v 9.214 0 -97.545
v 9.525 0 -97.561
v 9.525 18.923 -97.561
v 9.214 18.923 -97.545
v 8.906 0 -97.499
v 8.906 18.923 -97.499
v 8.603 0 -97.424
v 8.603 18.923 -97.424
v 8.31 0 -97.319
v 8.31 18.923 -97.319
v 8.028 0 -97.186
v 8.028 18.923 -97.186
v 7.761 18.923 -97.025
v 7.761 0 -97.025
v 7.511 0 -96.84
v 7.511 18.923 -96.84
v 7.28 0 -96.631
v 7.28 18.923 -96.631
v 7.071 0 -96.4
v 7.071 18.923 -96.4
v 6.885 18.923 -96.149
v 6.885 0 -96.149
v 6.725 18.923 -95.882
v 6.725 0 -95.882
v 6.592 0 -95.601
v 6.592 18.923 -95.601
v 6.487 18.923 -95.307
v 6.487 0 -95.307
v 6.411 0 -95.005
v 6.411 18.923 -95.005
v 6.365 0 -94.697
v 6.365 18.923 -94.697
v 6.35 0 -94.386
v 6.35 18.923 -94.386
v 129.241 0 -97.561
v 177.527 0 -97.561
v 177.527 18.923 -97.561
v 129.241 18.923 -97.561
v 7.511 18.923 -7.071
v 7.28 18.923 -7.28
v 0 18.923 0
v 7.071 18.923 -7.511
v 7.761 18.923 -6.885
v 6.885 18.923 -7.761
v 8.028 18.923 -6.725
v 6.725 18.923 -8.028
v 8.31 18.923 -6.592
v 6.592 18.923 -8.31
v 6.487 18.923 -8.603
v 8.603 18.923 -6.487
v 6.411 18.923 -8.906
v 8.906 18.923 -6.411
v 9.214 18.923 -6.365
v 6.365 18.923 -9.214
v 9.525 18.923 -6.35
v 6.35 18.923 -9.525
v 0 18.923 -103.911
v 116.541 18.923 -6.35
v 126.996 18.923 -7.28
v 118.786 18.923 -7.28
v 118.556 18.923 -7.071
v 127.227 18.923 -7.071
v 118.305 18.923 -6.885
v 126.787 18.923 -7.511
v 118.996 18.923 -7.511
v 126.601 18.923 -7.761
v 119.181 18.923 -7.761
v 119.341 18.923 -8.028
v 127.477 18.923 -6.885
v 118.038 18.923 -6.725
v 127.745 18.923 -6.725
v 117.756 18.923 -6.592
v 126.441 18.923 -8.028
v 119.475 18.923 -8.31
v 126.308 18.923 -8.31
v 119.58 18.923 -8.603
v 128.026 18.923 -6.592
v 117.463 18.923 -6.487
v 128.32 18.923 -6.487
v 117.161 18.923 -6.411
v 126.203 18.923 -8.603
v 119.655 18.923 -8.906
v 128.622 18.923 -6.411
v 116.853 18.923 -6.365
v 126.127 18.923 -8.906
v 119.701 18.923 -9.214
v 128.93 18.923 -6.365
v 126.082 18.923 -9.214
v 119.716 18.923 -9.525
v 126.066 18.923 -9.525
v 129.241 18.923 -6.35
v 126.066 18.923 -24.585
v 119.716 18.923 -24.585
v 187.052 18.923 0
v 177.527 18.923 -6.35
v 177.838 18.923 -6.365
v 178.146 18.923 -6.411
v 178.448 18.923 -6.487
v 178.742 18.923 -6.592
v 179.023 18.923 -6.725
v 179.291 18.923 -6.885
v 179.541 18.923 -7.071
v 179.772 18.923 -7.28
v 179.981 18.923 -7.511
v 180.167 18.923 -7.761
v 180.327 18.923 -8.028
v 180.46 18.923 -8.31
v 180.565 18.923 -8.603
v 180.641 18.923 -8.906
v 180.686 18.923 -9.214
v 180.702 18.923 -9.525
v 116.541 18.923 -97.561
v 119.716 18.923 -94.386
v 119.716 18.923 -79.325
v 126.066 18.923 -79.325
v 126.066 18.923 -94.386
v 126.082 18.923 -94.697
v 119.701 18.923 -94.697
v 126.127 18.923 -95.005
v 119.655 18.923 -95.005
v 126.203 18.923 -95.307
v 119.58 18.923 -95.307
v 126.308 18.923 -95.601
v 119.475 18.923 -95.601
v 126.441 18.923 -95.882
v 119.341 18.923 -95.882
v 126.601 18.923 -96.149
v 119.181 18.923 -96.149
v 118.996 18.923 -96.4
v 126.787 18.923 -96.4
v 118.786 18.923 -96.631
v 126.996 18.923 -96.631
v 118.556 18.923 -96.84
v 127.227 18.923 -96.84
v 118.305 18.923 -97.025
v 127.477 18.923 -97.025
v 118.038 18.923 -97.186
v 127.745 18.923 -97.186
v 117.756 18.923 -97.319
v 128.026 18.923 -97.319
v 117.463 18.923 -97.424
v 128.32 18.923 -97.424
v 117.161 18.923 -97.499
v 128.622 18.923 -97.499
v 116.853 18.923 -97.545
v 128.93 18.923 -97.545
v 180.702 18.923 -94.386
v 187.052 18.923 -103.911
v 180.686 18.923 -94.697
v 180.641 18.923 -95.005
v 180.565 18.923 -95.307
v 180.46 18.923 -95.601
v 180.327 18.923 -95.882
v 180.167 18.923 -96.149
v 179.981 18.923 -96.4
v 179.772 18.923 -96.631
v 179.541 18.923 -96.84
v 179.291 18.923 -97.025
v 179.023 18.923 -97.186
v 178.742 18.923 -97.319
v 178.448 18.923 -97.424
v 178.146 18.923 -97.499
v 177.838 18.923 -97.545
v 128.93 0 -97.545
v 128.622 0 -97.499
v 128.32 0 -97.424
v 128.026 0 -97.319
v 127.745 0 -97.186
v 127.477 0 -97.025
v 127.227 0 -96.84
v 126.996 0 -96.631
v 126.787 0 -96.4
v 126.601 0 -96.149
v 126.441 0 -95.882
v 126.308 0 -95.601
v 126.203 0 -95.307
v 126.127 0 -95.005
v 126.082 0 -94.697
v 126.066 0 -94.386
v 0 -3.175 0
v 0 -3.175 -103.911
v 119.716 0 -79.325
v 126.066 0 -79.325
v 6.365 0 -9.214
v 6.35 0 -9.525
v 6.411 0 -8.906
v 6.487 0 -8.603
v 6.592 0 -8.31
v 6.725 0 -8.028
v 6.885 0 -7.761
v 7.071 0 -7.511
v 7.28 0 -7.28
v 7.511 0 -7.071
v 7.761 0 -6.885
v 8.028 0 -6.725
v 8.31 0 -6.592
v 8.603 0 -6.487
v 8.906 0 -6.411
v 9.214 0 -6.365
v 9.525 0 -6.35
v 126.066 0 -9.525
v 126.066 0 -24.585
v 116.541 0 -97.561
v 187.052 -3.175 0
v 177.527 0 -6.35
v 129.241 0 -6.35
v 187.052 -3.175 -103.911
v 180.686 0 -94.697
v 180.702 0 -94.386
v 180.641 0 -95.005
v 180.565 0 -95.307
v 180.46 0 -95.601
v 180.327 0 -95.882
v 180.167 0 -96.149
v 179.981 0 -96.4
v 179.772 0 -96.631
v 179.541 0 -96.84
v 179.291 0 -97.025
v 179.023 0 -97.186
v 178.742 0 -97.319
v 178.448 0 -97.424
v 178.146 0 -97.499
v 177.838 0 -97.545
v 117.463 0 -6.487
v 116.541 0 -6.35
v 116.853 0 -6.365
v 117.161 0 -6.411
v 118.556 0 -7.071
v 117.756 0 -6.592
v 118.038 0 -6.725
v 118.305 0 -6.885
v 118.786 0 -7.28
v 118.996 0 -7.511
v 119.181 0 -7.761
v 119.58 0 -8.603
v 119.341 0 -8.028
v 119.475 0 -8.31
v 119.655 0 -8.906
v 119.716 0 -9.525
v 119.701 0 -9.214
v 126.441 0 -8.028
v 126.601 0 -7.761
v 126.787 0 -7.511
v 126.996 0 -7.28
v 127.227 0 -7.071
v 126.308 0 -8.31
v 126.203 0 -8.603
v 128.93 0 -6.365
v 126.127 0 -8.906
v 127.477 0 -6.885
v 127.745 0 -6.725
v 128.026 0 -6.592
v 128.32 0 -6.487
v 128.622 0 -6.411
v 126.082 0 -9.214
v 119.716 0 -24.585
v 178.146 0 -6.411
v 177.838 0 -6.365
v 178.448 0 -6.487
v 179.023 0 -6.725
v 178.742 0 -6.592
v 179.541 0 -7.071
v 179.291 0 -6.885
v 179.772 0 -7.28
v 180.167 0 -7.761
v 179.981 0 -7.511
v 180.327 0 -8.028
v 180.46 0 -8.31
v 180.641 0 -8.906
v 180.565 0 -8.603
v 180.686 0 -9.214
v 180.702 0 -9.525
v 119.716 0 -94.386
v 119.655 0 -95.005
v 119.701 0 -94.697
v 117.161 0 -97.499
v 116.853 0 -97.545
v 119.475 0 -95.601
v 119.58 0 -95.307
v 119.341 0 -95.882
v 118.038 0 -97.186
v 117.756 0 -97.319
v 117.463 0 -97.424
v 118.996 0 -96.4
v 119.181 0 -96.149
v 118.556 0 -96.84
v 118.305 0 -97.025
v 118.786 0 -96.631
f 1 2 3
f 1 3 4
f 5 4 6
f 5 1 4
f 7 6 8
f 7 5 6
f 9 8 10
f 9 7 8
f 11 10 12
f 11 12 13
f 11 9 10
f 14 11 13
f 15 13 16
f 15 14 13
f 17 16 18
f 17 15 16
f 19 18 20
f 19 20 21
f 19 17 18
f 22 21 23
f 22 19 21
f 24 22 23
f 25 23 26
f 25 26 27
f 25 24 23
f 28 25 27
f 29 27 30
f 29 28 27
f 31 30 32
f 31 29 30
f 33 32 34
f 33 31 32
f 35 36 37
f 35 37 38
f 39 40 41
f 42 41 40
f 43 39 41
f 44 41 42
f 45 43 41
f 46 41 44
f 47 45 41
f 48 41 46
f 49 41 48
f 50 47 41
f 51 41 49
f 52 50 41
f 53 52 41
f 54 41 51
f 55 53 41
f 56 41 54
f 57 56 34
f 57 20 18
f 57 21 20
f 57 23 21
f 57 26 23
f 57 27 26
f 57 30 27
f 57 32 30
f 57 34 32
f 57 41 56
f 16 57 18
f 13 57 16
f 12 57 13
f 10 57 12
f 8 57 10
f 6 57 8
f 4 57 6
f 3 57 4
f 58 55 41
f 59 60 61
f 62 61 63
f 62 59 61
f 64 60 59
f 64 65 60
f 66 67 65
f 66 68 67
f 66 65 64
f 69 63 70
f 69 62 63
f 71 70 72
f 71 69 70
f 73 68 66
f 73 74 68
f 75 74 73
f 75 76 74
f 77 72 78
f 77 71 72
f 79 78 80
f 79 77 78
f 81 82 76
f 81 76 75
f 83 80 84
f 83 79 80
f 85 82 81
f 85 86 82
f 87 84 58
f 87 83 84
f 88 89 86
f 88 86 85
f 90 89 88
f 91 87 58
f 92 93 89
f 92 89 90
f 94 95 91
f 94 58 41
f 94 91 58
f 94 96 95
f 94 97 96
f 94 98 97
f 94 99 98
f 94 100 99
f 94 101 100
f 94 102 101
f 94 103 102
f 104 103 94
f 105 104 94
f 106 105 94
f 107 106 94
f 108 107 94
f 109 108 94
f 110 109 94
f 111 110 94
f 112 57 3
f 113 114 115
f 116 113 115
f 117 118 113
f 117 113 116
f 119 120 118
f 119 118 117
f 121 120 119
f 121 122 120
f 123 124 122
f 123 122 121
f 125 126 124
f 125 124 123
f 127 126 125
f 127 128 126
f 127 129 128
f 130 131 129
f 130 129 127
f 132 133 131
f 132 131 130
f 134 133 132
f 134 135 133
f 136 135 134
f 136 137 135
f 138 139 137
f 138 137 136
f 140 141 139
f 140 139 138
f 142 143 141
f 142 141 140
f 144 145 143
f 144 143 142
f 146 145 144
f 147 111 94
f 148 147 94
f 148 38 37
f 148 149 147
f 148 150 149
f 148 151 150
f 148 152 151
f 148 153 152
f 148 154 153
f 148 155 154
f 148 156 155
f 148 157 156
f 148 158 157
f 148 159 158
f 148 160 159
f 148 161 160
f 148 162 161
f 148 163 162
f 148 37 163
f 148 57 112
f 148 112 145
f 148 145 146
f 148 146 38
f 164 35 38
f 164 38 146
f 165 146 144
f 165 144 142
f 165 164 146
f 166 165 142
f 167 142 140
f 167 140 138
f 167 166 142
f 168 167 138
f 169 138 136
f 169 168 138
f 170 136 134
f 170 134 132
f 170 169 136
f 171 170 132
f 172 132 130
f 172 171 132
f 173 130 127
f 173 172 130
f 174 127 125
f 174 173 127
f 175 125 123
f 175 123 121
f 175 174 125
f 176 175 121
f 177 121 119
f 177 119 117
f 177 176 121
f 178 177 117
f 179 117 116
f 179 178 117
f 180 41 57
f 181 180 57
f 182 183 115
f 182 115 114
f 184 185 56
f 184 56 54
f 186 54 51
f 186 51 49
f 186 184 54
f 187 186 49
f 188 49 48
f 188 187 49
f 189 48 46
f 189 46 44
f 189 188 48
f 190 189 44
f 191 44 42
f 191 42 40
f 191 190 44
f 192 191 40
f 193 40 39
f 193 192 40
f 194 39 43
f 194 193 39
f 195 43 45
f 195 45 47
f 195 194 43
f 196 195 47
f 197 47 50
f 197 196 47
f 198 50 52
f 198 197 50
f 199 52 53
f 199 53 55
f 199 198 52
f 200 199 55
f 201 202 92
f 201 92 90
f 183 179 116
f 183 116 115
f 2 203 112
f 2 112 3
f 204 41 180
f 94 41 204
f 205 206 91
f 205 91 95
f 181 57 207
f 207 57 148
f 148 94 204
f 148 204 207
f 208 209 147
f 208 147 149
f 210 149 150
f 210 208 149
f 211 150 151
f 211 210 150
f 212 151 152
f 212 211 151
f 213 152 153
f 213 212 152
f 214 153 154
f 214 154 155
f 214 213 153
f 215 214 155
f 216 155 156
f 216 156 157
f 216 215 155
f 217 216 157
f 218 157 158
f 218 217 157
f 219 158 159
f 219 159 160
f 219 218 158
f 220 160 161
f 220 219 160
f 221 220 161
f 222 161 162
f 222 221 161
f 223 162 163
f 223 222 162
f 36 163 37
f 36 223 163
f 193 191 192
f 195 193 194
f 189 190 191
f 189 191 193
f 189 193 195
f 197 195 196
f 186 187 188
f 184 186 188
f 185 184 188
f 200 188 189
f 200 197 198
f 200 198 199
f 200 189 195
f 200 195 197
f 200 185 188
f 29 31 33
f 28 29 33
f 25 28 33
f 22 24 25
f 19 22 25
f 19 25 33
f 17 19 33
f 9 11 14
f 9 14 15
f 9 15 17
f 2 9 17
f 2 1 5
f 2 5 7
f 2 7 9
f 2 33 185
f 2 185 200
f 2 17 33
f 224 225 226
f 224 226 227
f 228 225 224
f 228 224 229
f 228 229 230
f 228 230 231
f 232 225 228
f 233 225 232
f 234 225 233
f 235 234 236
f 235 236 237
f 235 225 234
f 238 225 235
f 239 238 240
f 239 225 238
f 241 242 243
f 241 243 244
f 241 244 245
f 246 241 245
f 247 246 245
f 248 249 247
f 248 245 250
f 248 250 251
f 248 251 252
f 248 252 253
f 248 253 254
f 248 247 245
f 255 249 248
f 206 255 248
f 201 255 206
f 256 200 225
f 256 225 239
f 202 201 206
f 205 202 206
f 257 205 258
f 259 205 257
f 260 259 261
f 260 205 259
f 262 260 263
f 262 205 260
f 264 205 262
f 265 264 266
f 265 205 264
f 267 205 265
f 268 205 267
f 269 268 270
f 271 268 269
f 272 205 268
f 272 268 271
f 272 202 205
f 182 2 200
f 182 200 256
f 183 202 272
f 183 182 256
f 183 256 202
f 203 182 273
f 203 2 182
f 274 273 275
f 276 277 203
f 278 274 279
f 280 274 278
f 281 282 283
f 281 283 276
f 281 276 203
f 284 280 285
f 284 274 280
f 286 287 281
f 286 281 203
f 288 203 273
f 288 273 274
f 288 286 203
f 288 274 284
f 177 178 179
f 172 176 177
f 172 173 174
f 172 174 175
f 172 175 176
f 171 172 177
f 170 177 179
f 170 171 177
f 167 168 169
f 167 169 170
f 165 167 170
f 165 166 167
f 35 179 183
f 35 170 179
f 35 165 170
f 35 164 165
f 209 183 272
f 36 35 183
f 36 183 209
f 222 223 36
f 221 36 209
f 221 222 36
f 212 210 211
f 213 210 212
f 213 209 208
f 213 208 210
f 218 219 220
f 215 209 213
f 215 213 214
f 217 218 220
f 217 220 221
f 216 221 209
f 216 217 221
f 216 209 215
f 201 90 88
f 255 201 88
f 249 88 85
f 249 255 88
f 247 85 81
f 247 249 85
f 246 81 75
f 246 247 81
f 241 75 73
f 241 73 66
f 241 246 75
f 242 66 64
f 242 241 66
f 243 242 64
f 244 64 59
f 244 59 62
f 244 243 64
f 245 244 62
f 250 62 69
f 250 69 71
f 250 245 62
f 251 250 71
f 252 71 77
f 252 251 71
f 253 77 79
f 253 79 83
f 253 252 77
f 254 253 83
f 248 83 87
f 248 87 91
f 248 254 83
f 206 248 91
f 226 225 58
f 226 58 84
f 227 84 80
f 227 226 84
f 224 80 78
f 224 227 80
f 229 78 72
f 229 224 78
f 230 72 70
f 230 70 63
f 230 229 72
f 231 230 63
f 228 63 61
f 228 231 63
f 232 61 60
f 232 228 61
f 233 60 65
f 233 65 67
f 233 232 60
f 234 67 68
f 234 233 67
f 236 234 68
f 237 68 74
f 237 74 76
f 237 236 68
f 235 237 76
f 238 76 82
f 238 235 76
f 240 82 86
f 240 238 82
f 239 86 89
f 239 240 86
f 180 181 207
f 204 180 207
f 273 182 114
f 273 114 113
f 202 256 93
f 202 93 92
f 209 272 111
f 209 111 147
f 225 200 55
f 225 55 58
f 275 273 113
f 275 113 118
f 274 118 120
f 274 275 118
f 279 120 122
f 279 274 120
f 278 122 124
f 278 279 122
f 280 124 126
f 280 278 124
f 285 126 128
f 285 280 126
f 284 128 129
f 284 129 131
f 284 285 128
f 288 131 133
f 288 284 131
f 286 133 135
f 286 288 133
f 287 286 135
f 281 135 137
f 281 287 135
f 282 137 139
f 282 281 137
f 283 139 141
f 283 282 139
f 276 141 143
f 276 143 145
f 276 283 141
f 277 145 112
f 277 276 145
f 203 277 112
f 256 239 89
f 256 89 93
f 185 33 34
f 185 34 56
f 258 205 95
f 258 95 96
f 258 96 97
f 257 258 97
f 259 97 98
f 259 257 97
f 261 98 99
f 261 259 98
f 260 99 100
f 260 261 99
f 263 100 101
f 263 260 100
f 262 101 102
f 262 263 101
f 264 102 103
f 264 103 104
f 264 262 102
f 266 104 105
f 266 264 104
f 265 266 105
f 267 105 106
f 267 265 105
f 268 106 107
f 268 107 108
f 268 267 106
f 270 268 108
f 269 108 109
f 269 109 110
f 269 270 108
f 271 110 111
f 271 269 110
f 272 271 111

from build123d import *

# Parameters (mm, degrees)
SKETCH11_W     = 187.05178758
SKETCH11_H     = 103.91050065
EXTRUDE5_DEPTH = 18.923
SKETCH14_W     = 187.05178758
SKETCH14_H     = 103.91050065
EXTRUDE6_DEPTH = 3.175


with BuildPart() as part:
    # Sketch11 → Extrude5 (new body)
    with BuildSketch(Plane(origin=(0, 0, 0), x_dir=(1, 0, 0), z_dir=(0, 1, 0))):
        with Locations((93.52589379, 51.955250325)):
            Rectangle(SKETCH11_W, SKETCH11_H)
        with BuildLine():
            Line((9.525, 6.35), (116.541319734, 6.35))
            ThreePointArc((116.541319734, 6.35), (118.786383764, 7.27993597), (119.716319734, 9.525))
            Line((119.716319734, 9.525), (119.716319734, 24.585352544))
            Line((119.716319734, 24.585352544), (126.066319734, 24.585352544))
            Line((126.066319734, 24.585352544), (126.066319734, 9.525))
            ThreePointArc((126.066319734, 9.525), (126.996255703, 7.27993597), (129.241319734, 6.35))
            Line((129.241319734, 6.35), (177.52678758, 6.35))
            ThreePointArc((177.52678758, 6.35), (179.77185161, 7.27993597), (180.70178758, 9.525))
            Line((180.70178758, 9.525), (180.70178758, 94.38550065))
            ThreePointArc((180.70178758, 94.38550065), (179.77185161, 96.63056468), (177.52678758, 97.56050065))
            Line((177.52678758, 97.56050065), (129.241319734, 97.56050065))
            ThreePointArc((129.241319734, 97.56050065), (126.996255703, 96.63056468), (126.066319734, 94.38550065))
            Line((126.066319734, 94.38550065), (126.066319734, 79.325148105))
            Line((126.066319734, 79.325148105), (119.716319734, 79.325148105))
            Line((119.716319734, 79.325148105), (119.716319734, 94.38550065))
            ThreePointArc((119.716319734, 94.38550065), (118.786383764, 96.63056468), (116.541319734, 97.56050065))
            Line((116.541319734, 97.56050065), (9.525, 97.56050065))
            ThreePointArc((9.525, 97.56050065), (7.27993597, 96.63056468), (6.35, 94.38550065))
            Line((6.35, 94.38550065), (6.35, 9.525))
            ThreePointArc((6.35, 9.525), (7.27993597, 7.27993597), (9.525, 6.35))
        make_face(mode=Mode.SUBTRACT)
    extrude(amount=EXTRUDE5_DEPTH)

    # Sketch14 → Extrude6 (add)
    with BuildSketch(Plane(origin=(0, 0, 0), x_dir=(1, 0, 0), z_dir=(0, 1, 0))):
        with Locations((93.52589379, 51.955250325)):
            Rectangle(SKETCH14_W, SKETCH14_H)
    extrude(amount=-EXTRUDE6_DEPTH)


solid = part.part
